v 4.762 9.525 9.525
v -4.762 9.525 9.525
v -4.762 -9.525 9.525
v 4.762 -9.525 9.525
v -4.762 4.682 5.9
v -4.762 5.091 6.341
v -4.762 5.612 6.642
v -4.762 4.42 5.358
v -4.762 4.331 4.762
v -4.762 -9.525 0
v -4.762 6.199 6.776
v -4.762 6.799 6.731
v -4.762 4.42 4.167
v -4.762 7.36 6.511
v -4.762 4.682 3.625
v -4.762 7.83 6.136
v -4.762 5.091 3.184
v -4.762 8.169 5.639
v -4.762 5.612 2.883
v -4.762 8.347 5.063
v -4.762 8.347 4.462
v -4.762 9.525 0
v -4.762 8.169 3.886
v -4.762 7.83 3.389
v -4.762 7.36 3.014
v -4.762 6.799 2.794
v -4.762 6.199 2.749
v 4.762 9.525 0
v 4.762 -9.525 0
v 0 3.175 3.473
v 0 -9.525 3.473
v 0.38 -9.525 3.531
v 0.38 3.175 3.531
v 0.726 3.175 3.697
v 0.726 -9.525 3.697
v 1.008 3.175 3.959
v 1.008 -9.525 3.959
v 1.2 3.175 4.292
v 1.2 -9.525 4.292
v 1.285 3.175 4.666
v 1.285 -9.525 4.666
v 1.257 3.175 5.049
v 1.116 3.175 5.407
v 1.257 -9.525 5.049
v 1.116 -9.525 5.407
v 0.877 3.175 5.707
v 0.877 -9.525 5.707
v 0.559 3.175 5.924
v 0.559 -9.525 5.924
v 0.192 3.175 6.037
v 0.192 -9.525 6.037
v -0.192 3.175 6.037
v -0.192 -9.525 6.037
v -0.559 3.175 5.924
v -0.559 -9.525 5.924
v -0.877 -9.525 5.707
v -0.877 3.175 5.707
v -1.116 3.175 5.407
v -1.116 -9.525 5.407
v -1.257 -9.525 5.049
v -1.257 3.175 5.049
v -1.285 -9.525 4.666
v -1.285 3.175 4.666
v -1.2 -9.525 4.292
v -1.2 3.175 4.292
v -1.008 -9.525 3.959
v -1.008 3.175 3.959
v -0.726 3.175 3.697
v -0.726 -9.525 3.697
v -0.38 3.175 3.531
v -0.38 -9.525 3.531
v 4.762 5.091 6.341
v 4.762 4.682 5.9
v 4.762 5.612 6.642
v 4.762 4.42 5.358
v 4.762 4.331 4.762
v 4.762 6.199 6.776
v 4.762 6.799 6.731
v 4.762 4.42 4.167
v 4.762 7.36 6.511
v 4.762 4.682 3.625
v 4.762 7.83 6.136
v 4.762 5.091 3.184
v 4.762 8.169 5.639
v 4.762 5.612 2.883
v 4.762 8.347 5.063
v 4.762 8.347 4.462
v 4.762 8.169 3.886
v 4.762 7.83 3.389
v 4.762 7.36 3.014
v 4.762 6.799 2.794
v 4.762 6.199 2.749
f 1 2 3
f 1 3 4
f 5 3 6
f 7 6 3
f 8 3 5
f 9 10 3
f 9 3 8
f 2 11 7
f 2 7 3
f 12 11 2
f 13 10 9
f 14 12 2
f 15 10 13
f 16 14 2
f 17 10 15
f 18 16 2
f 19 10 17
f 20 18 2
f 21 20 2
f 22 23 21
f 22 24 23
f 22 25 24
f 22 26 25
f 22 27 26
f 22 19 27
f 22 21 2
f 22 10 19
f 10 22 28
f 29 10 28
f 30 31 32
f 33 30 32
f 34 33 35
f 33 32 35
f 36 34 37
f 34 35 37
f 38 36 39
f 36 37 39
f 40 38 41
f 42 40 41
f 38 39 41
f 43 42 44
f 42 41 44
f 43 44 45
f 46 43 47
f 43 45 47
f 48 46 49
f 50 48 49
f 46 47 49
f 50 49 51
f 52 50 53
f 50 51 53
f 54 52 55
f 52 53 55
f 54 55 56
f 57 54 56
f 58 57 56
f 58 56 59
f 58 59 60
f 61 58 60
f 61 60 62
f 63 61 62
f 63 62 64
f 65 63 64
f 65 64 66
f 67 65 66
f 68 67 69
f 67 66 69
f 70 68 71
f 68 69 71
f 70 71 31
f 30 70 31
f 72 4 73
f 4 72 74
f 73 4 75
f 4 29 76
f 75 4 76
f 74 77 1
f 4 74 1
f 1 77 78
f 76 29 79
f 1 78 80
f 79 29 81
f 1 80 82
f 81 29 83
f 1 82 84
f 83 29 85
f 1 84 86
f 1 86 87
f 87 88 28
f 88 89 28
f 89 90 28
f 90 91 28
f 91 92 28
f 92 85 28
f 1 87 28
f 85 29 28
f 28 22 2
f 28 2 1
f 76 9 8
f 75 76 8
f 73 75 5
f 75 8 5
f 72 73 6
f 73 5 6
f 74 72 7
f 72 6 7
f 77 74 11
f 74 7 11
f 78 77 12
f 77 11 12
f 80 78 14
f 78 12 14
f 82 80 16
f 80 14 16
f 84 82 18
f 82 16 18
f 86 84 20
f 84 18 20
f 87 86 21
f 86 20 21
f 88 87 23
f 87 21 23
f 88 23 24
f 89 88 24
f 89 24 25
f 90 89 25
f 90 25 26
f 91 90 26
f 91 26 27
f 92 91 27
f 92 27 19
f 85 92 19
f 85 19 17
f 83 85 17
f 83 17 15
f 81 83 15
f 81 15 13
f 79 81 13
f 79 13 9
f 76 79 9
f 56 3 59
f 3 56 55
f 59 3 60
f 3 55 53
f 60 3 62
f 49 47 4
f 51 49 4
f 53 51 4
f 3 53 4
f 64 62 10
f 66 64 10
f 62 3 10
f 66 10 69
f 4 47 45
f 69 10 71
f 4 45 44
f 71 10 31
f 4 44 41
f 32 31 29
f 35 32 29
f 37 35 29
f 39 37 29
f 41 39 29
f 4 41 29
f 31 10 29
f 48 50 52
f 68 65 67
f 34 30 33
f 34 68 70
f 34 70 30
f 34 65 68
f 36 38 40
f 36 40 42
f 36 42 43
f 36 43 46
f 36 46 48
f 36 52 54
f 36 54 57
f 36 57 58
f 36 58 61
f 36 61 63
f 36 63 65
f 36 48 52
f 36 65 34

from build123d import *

# Parameters (mm, degrees)
SKETCH1_W           = 9.525
SKETCH1_H           = 19.05
BOSS_EXTRUDE1_DEPTH = 9.525
SKETCH2_R           = 1.28905
CUT_EXTRUDE1_DEPTH  = 12.7
SKETCH4_R           = 2.0193
CUT_EXTRUDE2_DEPTH  = 17.497783942


with BuildPart() as part:
    # Sketch1 → Boss-Extrude1 (new body)
    with BuildSketch(Plane.XY):
        Rectangle(SKETCH1_W, SKETCH1_H)
    extrude(amount=BOSS_EXTRUDE1_DEPTH)

    # Sketch2 → Cut-Extrude1 (cut)
    with BuildSketch(Plane.XZ.offset(9.525)):
        with Locations(Location((0, 4.7625, 0), (0, 0, 270))):
            Circle(SKETCH2_R)
    extrude(amount=-CUT_EXTRUDE1_DEPTH, mode=Mode.SUBTRACT)

    # Sketch4 → Cut-Extrude2 (cut, through all)
    with BuildSketch(Plane.ZY.offset(4.7625)):
        with Locations(Location((4.7625, 6.35, 0), (0, 0, 270))):
            Circle(SKETCH4_R)
    extrude(amount=-CUT_EXTRUDE2_DEPTH, mode=Mode.SUBTRACT)


solid = part.part
